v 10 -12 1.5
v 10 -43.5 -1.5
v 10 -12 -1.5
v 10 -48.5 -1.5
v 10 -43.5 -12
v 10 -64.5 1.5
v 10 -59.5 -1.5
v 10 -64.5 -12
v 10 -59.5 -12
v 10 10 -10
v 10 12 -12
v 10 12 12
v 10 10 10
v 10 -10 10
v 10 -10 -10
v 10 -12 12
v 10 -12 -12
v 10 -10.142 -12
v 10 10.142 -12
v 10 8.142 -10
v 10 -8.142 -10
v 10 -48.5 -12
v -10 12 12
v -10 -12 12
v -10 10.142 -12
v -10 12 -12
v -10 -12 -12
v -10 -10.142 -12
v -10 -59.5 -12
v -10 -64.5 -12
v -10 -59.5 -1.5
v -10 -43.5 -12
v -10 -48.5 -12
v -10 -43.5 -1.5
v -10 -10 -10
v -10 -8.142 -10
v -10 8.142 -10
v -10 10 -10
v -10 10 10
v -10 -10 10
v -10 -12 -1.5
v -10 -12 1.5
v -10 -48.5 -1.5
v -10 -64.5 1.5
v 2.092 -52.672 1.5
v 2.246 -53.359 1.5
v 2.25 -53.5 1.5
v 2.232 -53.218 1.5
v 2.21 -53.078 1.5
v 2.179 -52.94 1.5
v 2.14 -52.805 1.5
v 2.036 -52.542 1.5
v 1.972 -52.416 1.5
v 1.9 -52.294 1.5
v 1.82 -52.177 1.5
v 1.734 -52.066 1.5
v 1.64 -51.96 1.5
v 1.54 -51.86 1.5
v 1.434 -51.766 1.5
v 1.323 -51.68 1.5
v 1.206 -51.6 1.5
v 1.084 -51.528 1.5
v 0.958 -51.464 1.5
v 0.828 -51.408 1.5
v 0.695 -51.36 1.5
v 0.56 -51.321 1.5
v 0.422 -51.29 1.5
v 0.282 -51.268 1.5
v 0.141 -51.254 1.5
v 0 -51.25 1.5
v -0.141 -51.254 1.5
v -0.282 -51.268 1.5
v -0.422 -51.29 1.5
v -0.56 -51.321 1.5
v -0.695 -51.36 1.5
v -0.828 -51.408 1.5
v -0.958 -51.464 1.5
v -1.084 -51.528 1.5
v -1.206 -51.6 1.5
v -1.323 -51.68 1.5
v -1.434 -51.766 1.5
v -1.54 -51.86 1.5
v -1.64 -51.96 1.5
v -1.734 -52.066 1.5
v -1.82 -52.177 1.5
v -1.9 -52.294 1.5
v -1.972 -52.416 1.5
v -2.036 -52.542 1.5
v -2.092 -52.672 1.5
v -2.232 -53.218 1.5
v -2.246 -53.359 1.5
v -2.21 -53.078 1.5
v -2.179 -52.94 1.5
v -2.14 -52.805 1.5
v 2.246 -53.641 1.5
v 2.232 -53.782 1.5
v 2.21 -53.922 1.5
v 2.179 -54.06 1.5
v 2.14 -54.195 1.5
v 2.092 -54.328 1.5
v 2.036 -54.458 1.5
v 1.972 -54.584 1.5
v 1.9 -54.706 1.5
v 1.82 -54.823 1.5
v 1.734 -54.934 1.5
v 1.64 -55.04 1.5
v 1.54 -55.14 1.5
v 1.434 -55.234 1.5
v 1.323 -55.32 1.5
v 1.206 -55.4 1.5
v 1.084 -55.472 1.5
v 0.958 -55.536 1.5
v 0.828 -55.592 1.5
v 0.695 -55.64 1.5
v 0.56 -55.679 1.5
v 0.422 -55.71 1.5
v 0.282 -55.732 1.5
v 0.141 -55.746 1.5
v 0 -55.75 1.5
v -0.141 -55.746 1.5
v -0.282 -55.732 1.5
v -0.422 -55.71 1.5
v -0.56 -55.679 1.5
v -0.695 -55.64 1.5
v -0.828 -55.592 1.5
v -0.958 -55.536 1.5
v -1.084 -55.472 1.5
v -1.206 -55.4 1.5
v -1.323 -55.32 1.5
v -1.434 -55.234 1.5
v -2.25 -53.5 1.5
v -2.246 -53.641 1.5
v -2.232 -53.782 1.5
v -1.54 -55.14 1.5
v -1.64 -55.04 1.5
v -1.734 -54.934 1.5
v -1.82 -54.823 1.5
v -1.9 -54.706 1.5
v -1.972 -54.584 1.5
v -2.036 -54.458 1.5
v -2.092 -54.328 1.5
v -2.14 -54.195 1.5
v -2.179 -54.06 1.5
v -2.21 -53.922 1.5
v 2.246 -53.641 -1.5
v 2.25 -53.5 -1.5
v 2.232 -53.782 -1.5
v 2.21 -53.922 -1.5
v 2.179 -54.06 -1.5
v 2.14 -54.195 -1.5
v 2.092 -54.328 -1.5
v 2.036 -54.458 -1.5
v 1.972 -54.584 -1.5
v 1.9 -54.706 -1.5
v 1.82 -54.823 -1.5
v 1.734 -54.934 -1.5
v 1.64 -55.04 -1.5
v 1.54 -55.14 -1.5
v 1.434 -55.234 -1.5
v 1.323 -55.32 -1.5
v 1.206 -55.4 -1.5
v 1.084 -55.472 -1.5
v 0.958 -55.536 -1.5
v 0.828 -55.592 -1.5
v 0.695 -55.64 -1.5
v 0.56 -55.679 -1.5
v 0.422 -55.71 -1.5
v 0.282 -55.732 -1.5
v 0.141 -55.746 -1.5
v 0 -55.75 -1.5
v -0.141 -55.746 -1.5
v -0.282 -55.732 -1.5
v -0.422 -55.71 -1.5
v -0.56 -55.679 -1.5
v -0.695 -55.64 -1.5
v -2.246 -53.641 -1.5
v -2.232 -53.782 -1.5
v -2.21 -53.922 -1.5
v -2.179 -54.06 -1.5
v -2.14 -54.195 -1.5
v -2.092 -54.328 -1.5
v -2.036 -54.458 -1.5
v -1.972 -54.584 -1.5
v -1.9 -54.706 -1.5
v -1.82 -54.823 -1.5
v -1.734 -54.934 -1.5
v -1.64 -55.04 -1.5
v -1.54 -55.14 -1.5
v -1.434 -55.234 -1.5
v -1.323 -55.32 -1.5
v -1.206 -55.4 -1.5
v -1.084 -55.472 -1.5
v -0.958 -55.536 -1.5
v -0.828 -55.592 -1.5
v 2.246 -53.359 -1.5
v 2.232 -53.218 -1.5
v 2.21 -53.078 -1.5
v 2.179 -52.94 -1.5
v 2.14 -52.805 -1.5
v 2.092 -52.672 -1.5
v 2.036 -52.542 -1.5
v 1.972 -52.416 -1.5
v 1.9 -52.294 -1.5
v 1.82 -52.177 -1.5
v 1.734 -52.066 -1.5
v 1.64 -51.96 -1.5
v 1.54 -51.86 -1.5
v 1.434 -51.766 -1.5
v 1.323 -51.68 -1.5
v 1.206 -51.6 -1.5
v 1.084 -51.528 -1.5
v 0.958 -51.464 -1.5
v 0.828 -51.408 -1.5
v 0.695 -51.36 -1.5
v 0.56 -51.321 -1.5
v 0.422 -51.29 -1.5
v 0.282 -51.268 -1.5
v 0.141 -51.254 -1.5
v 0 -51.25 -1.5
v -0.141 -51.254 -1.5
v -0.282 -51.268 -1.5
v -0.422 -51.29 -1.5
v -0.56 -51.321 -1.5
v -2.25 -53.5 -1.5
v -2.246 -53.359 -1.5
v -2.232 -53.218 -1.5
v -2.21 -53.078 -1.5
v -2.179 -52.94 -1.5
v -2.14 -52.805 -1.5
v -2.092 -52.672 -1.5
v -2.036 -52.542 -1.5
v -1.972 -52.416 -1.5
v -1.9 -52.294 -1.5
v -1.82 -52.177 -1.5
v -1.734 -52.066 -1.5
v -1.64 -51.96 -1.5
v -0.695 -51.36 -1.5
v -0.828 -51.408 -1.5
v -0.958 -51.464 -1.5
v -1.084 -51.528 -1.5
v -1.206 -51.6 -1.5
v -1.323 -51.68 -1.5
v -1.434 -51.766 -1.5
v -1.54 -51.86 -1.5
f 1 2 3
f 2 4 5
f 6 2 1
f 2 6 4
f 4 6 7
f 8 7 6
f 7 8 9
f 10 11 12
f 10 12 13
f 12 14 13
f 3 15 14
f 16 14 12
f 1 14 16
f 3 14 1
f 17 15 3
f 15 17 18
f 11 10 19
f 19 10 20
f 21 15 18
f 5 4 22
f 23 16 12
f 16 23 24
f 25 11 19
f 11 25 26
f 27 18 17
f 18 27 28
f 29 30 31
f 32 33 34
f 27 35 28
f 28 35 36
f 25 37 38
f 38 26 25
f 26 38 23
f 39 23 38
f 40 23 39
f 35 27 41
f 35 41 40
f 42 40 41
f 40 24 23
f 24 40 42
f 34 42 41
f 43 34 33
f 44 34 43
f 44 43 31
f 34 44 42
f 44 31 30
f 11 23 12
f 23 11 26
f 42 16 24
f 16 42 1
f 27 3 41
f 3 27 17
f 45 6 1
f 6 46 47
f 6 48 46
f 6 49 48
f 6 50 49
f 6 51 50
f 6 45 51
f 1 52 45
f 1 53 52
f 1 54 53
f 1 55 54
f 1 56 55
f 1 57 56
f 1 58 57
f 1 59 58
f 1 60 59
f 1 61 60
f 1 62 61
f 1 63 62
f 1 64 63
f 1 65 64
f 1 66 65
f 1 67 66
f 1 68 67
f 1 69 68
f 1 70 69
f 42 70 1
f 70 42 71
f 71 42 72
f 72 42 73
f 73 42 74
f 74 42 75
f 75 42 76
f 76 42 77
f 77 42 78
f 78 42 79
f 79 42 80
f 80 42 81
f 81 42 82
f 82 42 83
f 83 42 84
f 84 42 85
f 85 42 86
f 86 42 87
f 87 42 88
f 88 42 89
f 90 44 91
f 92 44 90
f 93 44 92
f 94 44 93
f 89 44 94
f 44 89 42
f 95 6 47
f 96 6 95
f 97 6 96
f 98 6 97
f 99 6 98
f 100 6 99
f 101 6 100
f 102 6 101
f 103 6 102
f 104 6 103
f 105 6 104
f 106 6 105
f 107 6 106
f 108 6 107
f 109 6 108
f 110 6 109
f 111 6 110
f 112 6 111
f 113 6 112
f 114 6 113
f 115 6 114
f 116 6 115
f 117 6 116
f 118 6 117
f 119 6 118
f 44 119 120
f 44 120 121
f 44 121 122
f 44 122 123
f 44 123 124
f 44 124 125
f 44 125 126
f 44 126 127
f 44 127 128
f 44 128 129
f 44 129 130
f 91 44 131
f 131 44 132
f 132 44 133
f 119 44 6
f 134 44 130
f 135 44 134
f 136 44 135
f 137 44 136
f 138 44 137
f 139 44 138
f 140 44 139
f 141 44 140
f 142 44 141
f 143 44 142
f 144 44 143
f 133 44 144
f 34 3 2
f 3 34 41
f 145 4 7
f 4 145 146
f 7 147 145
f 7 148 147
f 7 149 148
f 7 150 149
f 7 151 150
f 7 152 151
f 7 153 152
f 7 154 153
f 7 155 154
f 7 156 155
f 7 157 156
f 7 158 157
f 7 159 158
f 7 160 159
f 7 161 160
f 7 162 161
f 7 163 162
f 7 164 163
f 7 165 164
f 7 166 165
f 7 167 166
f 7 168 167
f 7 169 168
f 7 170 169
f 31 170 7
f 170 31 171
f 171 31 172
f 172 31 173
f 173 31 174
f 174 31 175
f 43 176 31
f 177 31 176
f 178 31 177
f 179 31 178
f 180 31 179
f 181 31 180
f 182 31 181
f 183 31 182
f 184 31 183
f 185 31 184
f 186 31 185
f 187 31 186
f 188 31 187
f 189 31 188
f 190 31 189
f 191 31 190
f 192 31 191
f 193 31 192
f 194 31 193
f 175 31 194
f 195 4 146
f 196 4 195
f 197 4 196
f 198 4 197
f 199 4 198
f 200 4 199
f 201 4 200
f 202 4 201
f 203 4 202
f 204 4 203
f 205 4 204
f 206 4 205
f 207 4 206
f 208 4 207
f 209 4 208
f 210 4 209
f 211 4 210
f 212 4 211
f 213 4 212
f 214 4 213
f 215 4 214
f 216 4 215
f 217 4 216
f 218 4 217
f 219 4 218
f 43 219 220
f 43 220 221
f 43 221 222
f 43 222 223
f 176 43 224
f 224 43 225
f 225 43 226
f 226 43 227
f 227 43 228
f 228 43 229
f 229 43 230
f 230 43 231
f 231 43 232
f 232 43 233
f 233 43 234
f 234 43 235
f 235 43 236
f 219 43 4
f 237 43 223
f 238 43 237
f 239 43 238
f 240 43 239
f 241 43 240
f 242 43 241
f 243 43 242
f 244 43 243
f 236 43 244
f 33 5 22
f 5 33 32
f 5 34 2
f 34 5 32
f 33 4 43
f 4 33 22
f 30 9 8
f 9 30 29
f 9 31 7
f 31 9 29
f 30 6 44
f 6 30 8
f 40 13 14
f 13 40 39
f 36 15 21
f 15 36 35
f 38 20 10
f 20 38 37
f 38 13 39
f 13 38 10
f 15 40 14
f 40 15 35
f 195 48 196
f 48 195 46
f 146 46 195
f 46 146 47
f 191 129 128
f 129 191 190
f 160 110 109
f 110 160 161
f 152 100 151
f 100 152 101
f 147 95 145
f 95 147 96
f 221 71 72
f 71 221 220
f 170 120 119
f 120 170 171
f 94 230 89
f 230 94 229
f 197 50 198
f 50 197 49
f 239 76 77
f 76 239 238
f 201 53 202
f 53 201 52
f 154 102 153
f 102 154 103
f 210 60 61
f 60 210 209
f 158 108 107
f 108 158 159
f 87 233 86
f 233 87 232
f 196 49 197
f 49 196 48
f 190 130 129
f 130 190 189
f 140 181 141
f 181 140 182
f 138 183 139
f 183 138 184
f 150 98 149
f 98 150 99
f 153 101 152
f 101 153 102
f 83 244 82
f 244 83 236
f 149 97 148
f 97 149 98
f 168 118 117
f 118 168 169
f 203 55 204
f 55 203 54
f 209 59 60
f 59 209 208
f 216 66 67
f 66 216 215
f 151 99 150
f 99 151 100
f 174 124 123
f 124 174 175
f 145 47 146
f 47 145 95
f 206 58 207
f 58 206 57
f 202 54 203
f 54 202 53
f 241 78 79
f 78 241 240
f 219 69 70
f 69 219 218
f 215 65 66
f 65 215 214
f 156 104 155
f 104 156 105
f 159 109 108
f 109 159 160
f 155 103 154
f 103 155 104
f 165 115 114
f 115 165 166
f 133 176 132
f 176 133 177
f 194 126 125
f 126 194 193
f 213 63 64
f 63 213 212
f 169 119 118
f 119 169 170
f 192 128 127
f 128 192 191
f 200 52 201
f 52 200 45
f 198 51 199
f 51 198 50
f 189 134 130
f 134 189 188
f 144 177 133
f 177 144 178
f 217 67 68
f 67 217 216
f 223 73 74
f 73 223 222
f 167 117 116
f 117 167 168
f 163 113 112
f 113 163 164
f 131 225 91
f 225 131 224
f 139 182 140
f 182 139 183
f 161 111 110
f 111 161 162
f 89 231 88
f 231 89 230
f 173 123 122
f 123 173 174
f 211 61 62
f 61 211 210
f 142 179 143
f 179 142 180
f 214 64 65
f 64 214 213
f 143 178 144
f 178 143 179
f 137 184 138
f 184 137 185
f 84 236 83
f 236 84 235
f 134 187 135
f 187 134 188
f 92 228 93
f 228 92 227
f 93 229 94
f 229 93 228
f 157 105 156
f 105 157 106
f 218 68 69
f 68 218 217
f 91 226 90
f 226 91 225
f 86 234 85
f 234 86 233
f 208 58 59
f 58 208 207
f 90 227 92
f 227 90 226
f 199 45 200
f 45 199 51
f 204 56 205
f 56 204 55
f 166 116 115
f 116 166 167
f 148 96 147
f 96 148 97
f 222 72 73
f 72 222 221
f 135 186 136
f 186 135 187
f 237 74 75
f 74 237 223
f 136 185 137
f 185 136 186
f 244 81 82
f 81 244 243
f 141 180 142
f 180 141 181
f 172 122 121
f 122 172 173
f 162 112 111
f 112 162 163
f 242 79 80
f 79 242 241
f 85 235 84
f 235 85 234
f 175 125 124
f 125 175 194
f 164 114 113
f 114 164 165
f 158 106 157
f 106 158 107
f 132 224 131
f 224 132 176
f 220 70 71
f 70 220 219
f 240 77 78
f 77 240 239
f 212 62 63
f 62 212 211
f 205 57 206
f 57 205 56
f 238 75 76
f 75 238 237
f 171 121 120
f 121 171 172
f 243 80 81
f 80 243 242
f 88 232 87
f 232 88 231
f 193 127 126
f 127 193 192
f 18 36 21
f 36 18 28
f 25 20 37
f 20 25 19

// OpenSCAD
difference()
{

union()
{
color("blue") cube(size=[20,24,24], center=true);
color("red") translate([0,-36,0])  cube(size=[20, 48, 3], center=true);

color("DarkOrange") translate([0, -46,-6]) cube(size=[20, 5, 12], center=true);
color("DarkOrange") translate([0, -62,-5.25]) cube(size=[20, 5, 13.5], center=true);

}
cube(size=[25, 20, 20], center=true);
color("Indigo") translate([0,-53.5,-14]) cylinder(d=4.5, h=28, $fn=100);
color("Navy")  translate([0, 0, -16]) rotate([45,0,0]) cube([25, 20, 20], center=true);
}
